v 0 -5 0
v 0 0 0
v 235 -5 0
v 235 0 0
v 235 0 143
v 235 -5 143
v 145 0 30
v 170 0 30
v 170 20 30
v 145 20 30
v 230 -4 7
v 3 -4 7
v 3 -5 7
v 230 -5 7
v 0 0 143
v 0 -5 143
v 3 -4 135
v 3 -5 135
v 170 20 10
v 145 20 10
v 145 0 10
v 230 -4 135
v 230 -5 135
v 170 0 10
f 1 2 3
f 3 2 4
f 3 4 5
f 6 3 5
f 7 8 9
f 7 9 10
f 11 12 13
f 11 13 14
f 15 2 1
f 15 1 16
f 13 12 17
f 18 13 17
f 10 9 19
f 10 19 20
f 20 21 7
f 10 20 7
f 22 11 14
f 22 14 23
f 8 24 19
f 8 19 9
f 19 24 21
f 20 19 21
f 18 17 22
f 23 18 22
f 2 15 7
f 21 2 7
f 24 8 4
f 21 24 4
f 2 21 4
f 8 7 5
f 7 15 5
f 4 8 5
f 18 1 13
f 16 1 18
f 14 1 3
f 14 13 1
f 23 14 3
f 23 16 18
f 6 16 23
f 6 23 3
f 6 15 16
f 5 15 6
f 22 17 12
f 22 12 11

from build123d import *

# Parameters (mm, degrees)
F0_W     = 235
F0_H     = 143
F0_W_2   = 227
F0_H_2   = 128
F1_DEPTH = 5
F2_W     = 227
F2_H     = 128
F3_DEPTH = 4
F4_W     = 25
F4_H     = 20
F5_DEPTH = 20


with BuildPart() as f1:
    # F0 (on Front) → F1 (new body)
    with BuildSketch(Plane.XZ):
        with Locations((117.5, 71.5)):
            Rectangle(F0_W, F0_H)
        with Locations((116.5, 71)):
            Rectangle(F0_W_2, F0_H_2, mode=Mode.SUBTRACT)
    extrude(amount=F1_DEPTH)

    # F2 (on Front) → F3 (join)
    with BuildSketch(Plane.XZ):
        with Locations((116.5, 71)):
            Rectangle(F2_W, F2_H)
    extrude(amount=F3_DEPTH)

    # F4 (on face) → F5 (join)
    with BuildSketch(Plane(origin=(0, 0, 0), x_dir=(-1, 0, 0), z_dir=(0, 1, 0))):
        with Locations((-157.5, 20)):
            Rectangle(F4_W, F4_H)
    extrude(amount=F5_DEPTH)


solid = f1.part
